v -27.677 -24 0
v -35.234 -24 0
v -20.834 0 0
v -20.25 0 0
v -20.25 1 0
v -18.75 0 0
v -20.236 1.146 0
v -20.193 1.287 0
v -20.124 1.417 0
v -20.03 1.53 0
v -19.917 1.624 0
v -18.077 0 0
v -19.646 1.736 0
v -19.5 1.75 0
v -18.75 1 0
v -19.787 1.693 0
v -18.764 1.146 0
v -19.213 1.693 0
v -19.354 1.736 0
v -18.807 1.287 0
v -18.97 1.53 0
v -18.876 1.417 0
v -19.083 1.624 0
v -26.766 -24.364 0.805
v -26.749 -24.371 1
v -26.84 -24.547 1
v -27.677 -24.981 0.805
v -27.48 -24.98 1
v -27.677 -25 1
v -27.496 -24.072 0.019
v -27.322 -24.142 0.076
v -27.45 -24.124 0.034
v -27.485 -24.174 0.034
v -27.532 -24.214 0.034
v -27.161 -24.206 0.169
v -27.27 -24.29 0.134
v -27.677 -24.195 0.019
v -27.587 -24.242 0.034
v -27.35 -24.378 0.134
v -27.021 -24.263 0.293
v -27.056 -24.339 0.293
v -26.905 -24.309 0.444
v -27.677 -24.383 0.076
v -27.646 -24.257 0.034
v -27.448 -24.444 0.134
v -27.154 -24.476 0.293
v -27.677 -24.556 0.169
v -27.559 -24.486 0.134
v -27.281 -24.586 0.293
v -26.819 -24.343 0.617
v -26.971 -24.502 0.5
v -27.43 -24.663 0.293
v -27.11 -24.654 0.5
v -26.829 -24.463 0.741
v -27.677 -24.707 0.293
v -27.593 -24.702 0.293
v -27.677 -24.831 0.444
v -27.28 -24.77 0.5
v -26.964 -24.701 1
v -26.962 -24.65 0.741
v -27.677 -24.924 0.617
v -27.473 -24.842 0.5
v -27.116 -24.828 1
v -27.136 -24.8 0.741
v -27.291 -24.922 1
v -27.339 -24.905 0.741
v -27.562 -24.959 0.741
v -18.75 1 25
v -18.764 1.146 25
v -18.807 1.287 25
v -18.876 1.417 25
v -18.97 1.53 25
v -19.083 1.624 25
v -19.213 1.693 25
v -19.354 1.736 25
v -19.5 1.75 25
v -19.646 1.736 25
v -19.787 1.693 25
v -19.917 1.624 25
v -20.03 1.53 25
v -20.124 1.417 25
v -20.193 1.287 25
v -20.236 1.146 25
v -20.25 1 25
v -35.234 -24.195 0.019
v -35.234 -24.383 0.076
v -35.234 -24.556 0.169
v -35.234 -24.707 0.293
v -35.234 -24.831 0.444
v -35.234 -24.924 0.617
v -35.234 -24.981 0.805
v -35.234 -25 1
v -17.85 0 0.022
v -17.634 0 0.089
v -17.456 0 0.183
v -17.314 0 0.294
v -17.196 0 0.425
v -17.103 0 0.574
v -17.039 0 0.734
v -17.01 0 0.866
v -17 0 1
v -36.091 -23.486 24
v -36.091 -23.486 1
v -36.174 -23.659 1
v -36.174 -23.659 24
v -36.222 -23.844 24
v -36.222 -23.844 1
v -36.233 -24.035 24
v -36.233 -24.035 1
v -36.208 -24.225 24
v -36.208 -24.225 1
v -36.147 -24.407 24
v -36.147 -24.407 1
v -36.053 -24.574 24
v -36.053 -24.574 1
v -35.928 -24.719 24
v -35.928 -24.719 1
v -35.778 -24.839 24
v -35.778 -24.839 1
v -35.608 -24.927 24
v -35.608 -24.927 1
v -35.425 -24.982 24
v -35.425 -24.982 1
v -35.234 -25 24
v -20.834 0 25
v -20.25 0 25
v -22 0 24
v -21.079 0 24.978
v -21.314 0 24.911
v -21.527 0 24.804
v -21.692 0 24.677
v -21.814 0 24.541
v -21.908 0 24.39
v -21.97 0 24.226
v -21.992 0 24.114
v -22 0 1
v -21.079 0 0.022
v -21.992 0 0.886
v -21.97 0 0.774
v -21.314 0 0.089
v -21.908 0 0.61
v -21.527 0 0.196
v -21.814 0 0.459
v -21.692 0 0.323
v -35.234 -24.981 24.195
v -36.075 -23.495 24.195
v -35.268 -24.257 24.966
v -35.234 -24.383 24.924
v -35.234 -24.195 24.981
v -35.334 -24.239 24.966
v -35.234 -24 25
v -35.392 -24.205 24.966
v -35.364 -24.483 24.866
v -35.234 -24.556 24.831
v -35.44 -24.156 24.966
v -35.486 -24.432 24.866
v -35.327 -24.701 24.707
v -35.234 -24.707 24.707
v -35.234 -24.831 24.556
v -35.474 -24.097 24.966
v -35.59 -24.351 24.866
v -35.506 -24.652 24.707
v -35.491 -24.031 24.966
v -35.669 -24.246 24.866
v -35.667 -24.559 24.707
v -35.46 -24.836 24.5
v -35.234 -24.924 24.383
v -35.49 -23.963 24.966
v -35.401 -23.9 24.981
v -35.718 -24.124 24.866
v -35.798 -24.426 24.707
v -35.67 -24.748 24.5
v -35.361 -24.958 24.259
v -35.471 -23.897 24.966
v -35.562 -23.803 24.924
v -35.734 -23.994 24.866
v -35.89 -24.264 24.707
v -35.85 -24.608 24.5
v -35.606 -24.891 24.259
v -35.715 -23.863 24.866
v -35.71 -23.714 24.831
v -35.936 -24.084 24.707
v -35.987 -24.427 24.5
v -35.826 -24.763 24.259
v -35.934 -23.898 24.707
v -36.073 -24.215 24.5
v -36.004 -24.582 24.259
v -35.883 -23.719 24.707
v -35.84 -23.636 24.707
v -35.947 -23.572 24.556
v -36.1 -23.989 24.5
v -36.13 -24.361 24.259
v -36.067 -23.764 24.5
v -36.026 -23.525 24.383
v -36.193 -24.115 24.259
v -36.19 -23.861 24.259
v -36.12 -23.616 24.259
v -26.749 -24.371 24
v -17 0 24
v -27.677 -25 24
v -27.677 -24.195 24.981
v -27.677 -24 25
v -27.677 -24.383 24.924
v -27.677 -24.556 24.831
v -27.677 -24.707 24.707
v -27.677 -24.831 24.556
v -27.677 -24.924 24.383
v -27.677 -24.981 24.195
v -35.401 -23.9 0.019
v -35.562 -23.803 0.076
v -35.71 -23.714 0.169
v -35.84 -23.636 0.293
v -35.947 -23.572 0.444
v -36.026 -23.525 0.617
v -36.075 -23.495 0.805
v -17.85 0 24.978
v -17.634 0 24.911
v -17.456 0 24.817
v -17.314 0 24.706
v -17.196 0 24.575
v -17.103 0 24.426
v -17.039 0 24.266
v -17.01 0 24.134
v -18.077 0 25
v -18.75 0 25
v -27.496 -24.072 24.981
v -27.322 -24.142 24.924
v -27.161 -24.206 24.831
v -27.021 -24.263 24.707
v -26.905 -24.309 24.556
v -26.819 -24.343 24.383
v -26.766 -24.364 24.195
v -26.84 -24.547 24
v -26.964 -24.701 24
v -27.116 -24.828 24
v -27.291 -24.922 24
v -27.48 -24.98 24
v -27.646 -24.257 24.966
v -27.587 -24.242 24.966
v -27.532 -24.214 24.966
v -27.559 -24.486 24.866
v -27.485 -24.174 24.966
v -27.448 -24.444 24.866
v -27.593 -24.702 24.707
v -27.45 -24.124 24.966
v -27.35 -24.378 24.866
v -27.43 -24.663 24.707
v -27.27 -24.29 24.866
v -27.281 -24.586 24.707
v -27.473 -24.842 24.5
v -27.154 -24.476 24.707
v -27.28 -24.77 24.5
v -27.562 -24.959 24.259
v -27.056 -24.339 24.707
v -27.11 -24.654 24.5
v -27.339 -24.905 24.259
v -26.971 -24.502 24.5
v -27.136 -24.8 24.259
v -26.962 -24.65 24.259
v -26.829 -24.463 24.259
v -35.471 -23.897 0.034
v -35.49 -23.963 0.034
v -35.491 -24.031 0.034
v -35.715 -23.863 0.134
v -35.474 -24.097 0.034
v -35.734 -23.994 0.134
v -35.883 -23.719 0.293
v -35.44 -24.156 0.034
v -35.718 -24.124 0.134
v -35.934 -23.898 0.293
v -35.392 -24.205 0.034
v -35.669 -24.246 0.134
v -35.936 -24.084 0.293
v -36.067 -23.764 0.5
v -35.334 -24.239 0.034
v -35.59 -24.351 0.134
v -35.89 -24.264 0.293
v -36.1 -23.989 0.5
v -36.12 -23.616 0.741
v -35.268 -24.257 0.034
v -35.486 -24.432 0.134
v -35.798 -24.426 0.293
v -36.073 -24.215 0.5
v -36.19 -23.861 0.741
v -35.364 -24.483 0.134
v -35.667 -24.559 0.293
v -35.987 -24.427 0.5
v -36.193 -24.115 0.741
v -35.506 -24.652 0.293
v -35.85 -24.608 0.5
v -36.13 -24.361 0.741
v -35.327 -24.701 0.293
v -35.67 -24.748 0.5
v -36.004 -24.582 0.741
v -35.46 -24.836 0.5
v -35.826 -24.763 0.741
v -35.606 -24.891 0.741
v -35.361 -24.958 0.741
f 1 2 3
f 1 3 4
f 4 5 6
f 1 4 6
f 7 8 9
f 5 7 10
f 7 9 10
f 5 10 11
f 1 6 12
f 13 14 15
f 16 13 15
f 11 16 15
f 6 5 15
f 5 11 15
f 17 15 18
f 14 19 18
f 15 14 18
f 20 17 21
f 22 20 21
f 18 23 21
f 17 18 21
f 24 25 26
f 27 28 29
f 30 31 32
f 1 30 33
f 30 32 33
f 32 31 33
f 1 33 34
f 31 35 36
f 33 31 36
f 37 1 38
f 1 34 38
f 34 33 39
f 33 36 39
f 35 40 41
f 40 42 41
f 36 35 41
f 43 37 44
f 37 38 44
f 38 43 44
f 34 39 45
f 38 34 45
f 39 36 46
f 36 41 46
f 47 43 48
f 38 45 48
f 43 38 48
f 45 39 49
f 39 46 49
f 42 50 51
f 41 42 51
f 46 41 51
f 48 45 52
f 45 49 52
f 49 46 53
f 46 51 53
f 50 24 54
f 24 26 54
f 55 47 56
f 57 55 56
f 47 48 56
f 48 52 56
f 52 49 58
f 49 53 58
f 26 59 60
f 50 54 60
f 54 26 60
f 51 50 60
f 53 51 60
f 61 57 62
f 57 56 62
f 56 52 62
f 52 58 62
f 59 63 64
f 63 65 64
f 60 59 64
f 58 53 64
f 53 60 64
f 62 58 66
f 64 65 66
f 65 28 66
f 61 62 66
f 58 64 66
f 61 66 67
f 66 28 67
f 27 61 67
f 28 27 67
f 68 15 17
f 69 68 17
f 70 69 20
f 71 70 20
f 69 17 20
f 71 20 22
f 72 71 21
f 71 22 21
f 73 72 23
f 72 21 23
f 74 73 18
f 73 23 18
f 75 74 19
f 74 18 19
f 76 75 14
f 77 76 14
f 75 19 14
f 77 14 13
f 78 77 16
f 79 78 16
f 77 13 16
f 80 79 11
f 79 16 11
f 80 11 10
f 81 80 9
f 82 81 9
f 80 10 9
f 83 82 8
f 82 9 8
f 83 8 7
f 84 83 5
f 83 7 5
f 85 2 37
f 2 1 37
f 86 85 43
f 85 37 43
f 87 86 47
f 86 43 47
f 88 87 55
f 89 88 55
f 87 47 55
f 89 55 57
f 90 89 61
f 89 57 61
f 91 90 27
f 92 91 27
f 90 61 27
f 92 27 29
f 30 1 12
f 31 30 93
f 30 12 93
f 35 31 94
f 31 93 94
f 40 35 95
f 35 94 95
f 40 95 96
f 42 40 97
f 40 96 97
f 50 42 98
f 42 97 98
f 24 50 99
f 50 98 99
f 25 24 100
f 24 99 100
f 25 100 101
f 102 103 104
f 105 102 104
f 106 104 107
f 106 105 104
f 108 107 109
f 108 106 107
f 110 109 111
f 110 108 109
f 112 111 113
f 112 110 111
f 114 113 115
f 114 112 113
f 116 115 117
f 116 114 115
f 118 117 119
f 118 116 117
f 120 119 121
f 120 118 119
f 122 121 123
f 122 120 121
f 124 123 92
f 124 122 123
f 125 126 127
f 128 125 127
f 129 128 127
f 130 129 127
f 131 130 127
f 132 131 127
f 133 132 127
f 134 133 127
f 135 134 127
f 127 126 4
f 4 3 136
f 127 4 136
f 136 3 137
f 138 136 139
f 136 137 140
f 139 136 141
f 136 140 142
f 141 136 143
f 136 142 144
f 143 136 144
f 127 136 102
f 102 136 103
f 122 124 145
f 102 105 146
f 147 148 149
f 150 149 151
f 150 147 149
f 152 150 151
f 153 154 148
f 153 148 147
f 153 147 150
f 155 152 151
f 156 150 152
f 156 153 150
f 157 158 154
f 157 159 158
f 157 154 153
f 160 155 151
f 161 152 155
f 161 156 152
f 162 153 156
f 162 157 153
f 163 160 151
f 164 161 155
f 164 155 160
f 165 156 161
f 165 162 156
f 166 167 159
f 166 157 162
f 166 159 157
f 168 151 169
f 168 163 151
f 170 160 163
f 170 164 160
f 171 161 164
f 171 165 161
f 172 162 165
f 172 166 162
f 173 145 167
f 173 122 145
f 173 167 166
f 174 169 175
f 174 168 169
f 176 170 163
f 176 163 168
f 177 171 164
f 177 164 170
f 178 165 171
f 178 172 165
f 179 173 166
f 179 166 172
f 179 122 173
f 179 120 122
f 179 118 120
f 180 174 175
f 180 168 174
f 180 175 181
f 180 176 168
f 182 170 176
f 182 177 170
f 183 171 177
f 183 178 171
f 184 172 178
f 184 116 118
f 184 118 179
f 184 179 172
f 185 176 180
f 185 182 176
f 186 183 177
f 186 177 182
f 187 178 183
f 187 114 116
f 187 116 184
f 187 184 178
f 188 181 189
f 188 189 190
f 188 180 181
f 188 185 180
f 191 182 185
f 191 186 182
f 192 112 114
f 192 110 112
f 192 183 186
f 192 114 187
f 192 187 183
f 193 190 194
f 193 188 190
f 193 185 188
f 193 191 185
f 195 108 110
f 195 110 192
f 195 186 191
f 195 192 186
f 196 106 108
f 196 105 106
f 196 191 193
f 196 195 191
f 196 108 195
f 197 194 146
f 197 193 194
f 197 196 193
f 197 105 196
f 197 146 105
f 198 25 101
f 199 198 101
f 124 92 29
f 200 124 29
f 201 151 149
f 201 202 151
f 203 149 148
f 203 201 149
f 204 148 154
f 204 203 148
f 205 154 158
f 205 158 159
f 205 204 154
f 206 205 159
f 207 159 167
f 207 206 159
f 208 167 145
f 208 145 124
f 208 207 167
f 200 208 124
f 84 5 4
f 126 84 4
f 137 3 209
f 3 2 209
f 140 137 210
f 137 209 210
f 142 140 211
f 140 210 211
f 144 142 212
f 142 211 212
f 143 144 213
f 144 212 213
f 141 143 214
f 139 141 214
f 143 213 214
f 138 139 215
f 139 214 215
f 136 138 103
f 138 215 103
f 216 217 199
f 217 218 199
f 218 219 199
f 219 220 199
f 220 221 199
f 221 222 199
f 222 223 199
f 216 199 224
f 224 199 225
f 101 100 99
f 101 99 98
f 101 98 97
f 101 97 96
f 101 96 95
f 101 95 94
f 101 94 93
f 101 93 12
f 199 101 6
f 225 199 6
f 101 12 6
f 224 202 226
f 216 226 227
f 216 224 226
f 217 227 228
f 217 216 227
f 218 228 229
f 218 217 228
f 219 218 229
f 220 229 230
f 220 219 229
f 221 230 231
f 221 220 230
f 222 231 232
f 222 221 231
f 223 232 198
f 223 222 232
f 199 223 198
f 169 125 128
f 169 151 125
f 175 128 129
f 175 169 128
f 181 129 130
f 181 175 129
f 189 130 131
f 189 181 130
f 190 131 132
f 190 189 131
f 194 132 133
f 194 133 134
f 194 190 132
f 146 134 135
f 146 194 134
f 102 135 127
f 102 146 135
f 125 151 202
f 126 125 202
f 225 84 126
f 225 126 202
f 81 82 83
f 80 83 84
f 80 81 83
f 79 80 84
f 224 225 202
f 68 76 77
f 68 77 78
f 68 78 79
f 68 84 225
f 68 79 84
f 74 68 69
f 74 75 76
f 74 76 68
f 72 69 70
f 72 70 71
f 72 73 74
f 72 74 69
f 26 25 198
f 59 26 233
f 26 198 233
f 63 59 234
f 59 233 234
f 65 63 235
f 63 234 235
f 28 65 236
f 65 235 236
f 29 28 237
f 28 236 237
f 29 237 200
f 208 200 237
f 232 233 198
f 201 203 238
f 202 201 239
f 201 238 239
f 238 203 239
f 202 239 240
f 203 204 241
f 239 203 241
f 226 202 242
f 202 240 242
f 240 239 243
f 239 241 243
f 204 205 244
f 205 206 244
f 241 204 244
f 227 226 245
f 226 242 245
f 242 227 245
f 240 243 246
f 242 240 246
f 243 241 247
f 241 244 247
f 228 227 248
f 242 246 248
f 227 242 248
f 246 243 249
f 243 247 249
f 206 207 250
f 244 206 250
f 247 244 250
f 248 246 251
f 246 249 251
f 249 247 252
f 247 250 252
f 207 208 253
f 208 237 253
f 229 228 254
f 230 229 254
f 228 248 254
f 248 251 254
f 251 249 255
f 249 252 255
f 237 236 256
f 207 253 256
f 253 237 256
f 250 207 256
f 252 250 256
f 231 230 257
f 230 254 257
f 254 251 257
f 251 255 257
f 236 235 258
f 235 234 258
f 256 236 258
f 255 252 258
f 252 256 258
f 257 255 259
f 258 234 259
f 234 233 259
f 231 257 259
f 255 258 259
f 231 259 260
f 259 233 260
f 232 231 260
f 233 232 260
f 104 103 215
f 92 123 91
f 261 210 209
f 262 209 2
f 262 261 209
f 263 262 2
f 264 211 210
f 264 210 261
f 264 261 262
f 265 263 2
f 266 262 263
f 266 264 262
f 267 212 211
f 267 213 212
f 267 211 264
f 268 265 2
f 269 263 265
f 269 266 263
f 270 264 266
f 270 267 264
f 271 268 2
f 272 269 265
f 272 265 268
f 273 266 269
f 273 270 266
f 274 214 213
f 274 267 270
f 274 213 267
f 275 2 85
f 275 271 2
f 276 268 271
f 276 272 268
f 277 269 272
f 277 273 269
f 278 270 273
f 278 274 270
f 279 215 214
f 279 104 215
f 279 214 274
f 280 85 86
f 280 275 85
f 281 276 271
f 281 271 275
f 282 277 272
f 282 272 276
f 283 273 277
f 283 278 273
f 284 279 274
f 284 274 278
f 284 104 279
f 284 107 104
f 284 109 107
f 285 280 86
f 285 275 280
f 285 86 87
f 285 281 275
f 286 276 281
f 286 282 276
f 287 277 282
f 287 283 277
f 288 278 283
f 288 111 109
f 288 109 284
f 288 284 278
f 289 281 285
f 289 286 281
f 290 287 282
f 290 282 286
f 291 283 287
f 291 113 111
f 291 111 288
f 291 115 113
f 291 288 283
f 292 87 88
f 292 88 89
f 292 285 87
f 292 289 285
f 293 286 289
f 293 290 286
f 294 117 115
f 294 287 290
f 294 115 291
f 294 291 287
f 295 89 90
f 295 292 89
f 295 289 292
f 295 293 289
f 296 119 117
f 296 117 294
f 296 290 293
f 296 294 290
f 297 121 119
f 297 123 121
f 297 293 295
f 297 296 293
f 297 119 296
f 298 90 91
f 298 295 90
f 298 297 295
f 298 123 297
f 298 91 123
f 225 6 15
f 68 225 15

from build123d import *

# Parameters (mm, degrees)
F2_DEPTH = 25
F3_DEPTH = 25
F5_R     = 1


with BuildPart() as f2:
    # F0 (on Top) → F2 (new body)
    with BuildSketch(Plane.XY):
        Polygon((-17, 0), (-22, 0), (-37, -25), (-27, -25), align=None)
    extrude(amount=F2_DEPTH)

    # F1 (on Top) → F3 (join)
    with BuildSketch(Plane.XY):
        with BuildLine():
            Line((-20.25, 1), (-20.25, 0))
            Line((-20.25, 0), (-18.75, 0))
            Line((-18.75, 0), (-18.75, 1))
            ThreePointArc((-18.75, 1), (-19.5, 0.25), (-20.25, 1))
        make_face()
        with BuildLine():
            ThreePointArc((-18.75, 1), (-19.5, 1.75), (-20.25, 1))
            Line((-20.25, 1), (-18.75, 1))
        make_face()
        with BuildLine():
            Line((-18.75, 1), (-20.25, 1))
            ThreePointArc((-20.25, 1), (-19.5, 0.25), (-18.75, 1))
        make_face()
    extrude(amount=F3_DEPTH)

    # F5
    f5_edges = [f2.edges().sort_by_distance(p)[0] for p in [
        (-22, -12.5, 0),
        (-29.5, -12.5, 0),
        (-29.5, -12.5, 25),
        (-22, -12.5, 25),
        (-32, -25, 0),
        (-27, -25, 12.5),
        (-37, -25, 12.5),
        (-32, -25, 25),
    ]]
    fillet(f5_edges, radius=F5_R)


with BuildPart() as f2b:
    # F0 (on Top) → F2, piece 2 (new body)
    with BuildSketch(Plane.XY):
        Polygon((37, -25), (22, 0), (17, 0), (27, -25), align=None)
    extrude(amount=F2_DEPTH)

    # F1 (on Top) → F3, piece 2 (join)
    with BuildSketch(Plane.XY):
        with BuildLine():
            ThreePointArc((18.75, 1), (19.5, 0.25), (20.25, 1))
            ThreePointArc((20.25, 1), (19.5, 1.75), (18.75, 1))
        make_face()
        with BuildLine():
            Line((20.25, 0), (20.25, 1))
            ThreePointArc((20.25, 1), (19.5, 0.25), (18.75, 1))
            Line((18.75, 1), (18.75, 0))
            Line((18.75, 0), (20.25, 0))
        make_face()
    extrude(amount=F3_DEPTH)


solid = f2.part
